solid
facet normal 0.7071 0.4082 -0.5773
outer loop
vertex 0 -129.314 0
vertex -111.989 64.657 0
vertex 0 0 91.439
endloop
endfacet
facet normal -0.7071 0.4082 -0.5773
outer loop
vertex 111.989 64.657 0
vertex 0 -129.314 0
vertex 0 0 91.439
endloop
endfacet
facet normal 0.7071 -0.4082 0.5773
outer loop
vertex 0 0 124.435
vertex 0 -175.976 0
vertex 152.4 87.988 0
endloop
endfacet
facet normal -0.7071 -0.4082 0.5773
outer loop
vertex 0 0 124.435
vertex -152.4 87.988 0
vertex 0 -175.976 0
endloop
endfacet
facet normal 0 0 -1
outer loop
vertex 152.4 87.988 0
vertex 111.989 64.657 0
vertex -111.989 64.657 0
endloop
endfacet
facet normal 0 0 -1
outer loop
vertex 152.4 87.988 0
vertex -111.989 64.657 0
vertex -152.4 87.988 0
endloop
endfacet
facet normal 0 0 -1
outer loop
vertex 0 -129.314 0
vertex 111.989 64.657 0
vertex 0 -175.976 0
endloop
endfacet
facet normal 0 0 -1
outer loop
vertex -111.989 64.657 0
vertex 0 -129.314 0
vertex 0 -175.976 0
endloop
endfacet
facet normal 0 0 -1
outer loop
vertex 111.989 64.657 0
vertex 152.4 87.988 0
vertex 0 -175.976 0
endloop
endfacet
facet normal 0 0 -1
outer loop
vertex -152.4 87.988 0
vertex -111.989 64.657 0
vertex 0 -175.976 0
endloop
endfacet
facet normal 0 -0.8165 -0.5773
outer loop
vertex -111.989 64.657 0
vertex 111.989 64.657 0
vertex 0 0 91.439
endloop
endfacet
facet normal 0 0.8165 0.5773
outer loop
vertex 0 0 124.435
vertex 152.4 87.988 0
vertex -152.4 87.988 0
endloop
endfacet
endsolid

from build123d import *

# Parameters (mm, degrees)
F3_T = -19.05


with BuildPart() as f2:
    # F0 (on Top) → F2 section 0
    with BuildSketch(Plane.XY, mode=Mode.PRIVATE) as f2_s0:
        Polygon((152.4, 87.988181), (-152.4, 87.988181), (0, -175.976362), align=None)
    loft([f2_s0.sketch, Vertex(0, 0, 124.4346)])

    # F3
    f3_openings = [f2.faces().sort_by_distance(p)[0] for p in [
        (0, 0, 0),
    ]]
    offset(amount=F3_T, openings=f3_openings)


solid = f2.part
